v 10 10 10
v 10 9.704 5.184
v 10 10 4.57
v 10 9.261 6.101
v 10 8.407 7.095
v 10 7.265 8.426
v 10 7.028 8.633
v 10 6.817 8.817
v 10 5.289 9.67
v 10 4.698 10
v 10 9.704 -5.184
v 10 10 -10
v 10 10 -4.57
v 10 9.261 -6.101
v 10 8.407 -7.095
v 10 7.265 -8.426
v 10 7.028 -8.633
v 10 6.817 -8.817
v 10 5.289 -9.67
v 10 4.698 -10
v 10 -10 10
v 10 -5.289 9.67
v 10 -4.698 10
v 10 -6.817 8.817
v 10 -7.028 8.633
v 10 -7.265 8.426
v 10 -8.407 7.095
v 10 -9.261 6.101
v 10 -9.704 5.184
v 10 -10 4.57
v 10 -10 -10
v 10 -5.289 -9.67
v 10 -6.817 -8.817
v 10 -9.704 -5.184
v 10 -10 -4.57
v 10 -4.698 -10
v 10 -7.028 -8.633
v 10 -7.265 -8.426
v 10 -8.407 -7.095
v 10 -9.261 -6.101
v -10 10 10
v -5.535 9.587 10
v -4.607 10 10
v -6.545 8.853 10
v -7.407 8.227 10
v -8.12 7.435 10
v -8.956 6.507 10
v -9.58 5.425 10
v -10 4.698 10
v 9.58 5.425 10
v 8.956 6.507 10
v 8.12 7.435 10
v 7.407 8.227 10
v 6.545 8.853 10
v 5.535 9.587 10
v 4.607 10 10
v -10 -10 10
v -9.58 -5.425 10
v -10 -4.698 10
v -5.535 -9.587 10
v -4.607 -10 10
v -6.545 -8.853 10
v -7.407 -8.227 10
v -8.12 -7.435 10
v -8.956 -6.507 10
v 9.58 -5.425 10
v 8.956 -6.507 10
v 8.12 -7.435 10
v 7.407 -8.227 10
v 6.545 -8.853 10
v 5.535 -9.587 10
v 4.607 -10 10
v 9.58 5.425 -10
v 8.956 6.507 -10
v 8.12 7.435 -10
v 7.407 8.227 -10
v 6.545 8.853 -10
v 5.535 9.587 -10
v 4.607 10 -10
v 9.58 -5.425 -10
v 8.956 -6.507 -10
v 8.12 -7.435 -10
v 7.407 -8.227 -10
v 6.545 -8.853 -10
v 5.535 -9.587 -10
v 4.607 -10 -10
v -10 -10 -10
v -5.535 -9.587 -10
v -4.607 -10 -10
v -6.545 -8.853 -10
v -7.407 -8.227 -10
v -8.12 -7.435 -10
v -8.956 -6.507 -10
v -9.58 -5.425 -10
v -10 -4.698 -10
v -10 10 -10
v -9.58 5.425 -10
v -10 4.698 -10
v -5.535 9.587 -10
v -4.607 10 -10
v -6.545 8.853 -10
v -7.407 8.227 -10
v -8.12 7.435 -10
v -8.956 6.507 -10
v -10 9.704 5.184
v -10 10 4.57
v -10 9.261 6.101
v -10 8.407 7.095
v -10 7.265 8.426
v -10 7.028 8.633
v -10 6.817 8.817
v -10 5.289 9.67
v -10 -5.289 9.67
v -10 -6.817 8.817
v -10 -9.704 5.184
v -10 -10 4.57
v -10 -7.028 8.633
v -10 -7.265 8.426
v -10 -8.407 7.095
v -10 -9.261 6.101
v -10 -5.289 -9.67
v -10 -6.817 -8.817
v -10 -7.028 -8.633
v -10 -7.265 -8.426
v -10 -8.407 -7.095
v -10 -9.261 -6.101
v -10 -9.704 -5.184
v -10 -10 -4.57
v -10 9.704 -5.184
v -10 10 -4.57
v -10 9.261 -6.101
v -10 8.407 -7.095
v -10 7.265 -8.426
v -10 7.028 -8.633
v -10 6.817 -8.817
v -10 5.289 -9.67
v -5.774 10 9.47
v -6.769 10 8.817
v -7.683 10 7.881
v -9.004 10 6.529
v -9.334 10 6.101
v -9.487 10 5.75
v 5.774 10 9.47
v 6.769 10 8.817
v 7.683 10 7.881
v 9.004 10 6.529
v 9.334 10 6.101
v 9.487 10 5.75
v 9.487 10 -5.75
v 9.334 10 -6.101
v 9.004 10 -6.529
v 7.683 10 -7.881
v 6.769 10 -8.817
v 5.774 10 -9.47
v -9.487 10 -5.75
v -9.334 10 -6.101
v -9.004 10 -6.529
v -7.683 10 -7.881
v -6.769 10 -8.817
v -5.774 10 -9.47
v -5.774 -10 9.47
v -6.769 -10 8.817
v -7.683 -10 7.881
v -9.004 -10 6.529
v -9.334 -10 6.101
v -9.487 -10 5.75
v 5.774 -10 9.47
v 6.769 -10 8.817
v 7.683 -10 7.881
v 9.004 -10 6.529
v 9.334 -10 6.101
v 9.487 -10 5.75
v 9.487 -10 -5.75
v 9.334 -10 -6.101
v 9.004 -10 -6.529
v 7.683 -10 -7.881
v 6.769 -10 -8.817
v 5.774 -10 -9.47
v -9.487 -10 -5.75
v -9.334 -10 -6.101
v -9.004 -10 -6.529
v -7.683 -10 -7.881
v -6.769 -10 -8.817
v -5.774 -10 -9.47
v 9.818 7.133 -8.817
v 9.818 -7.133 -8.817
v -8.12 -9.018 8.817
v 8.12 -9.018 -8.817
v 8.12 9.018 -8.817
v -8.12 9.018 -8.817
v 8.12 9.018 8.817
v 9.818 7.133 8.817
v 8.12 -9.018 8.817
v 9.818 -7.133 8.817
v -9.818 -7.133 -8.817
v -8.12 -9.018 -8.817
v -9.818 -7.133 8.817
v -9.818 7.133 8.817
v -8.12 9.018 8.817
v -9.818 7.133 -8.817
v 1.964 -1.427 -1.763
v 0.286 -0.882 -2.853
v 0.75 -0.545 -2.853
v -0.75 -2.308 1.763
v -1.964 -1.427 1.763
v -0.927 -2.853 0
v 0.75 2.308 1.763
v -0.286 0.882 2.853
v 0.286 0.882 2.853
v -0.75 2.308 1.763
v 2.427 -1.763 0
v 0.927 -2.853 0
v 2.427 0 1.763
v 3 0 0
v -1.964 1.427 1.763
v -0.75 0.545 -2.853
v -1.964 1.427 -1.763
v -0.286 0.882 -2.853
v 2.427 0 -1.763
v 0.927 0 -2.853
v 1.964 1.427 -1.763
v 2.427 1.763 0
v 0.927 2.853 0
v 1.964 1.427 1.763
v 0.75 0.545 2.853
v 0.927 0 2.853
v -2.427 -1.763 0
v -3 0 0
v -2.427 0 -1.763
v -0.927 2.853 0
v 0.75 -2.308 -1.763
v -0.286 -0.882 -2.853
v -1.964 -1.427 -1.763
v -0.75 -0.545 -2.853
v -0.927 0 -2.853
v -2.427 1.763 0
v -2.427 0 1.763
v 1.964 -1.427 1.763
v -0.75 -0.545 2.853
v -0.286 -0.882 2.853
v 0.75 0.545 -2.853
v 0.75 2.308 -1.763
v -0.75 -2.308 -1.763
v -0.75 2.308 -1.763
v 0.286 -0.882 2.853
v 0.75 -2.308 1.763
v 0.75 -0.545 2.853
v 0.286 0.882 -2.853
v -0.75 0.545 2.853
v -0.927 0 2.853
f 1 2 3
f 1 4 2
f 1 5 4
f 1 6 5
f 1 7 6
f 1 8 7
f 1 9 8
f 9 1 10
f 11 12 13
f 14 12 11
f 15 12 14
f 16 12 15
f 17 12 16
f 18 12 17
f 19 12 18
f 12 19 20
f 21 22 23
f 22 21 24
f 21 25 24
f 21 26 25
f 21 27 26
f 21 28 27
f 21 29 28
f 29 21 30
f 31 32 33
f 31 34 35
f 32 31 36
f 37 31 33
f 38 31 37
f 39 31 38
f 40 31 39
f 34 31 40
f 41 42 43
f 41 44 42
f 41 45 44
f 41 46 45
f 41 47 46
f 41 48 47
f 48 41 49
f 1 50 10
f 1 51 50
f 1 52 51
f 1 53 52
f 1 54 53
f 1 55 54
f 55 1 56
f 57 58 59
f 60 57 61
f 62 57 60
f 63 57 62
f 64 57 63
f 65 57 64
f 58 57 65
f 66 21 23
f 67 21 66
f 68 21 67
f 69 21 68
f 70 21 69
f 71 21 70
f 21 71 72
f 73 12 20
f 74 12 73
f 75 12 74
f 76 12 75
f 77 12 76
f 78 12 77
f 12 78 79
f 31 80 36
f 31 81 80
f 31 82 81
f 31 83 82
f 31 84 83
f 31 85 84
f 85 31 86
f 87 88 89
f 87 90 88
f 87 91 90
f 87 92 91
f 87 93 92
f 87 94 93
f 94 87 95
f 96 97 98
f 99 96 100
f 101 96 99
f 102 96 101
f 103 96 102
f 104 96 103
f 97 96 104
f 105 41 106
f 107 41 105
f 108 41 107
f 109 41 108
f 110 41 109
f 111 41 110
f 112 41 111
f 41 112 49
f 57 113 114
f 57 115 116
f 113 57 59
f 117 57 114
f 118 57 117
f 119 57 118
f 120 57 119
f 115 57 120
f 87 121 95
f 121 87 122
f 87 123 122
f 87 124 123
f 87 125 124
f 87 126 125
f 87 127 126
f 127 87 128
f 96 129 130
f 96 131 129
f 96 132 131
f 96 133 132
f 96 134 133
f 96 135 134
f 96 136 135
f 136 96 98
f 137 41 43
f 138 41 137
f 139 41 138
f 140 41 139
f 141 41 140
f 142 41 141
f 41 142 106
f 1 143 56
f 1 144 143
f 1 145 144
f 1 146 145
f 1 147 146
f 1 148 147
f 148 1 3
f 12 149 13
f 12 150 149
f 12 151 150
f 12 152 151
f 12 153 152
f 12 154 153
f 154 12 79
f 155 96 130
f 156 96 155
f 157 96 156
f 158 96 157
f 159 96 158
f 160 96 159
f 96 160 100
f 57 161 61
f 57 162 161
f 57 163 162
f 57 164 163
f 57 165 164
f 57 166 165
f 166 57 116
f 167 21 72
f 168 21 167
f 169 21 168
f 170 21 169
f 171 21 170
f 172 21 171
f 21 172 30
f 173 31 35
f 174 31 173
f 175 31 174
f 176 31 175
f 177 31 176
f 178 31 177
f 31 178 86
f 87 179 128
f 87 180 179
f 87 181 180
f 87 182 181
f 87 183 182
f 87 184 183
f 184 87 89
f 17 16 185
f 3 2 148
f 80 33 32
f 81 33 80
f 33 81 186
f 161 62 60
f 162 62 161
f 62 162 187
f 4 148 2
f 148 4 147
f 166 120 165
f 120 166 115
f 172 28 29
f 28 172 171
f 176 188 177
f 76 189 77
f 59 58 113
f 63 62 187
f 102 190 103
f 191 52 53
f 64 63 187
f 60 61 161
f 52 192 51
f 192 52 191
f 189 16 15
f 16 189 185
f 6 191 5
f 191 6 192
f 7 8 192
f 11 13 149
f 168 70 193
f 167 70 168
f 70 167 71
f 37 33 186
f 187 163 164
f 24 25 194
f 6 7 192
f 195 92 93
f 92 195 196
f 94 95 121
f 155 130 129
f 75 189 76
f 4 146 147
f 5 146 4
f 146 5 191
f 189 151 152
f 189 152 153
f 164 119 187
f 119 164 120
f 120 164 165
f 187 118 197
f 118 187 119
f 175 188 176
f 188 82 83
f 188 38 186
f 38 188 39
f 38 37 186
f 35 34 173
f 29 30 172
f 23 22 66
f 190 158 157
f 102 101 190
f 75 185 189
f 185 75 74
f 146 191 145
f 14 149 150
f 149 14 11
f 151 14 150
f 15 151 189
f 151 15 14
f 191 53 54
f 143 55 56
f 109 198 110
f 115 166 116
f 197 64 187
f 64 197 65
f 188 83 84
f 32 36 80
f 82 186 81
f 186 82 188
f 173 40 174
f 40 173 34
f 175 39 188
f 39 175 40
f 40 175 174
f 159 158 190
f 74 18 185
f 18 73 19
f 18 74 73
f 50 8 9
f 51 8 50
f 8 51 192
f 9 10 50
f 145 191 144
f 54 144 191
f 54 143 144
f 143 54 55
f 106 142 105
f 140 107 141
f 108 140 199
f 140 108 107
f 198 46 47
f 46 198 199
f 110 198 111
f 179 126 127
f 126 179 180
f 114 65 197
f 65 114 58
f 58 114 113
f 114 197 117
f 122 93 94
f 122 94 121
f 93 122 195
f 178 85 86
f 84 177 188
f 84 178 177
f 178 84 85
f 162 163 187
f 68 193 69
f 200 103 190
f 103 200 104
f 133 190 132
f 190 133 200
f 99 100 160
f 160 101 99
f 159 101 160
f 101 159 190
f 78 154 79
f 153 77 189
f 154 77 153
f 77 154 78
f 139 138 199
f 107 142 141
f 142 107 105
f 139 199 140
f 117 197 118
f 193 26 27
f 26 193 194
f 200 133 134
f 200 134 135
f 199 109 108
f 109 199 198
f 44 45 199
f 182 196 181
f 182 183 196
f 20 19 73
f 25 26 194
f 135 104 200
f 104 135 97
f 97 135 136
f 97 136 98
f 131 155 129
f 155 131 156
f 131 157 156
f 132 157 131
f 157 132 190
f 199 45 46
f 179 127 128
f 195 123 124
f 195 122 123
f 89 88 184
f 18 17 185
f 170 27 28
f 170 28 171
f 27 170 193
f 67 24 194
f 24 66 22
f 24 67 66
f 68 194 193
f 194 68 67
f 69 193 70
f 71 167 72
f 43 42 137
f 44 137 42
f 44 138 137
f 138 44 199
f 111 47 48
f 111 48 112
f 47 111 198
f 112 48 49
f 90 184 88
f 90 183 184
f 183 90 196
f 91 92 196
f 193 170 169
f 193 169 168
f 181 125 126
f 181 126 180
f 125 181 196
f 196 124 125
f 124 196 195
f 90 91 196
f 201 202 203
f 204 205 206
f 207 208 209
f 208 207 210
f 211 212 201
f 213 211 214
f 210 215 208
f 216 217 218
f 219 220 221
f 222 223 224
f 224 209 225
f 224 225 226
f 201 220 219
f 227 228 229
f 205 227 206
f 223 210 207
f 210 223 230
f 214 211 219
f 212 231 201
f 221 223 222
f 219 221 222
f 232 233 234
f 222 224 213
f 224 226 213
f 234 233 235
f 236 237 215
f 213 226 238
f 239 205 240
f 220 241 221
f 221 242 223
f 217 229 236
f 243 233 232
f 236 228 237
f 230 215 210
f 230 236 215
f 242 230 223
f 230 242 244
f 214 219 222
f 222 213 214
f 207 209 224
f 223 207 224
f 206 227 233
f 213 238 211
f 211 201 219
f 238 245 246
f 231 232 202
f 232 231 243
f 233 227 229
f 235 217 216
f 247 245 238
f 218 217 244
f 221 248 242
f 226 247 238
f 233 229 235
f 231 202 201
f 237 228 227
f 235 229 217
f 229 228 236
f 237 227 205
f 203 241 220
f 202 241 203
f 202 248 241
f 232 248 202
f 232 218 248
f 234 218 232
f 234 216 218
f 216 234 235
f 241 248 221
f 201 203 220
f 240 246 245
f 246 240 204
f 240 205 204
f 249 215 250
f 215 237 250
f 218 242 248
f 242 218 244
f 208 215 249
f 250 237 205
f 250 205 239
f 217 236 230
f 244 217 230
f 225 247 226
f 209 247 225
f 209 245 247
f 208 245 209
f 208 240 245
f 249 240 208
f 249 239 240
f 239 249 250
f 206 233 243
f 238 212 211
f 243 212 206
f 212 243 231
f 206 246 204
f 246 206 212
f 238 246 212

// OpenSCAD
// file: constants.scad
// All lengths in units of mm
// Lodable by BOTH asymptote and openscad
bearing_id=4;
bearing_od=16;
bearing_h=5;

material_t=1.88;
// main file
include <constants.scad>
/*cube([10,20,30],center=true);*/
union(){
	difference(){
		cube(20,center=true);
		sphere(15,center=true);
	}
	sphere(3,center=true);
}
